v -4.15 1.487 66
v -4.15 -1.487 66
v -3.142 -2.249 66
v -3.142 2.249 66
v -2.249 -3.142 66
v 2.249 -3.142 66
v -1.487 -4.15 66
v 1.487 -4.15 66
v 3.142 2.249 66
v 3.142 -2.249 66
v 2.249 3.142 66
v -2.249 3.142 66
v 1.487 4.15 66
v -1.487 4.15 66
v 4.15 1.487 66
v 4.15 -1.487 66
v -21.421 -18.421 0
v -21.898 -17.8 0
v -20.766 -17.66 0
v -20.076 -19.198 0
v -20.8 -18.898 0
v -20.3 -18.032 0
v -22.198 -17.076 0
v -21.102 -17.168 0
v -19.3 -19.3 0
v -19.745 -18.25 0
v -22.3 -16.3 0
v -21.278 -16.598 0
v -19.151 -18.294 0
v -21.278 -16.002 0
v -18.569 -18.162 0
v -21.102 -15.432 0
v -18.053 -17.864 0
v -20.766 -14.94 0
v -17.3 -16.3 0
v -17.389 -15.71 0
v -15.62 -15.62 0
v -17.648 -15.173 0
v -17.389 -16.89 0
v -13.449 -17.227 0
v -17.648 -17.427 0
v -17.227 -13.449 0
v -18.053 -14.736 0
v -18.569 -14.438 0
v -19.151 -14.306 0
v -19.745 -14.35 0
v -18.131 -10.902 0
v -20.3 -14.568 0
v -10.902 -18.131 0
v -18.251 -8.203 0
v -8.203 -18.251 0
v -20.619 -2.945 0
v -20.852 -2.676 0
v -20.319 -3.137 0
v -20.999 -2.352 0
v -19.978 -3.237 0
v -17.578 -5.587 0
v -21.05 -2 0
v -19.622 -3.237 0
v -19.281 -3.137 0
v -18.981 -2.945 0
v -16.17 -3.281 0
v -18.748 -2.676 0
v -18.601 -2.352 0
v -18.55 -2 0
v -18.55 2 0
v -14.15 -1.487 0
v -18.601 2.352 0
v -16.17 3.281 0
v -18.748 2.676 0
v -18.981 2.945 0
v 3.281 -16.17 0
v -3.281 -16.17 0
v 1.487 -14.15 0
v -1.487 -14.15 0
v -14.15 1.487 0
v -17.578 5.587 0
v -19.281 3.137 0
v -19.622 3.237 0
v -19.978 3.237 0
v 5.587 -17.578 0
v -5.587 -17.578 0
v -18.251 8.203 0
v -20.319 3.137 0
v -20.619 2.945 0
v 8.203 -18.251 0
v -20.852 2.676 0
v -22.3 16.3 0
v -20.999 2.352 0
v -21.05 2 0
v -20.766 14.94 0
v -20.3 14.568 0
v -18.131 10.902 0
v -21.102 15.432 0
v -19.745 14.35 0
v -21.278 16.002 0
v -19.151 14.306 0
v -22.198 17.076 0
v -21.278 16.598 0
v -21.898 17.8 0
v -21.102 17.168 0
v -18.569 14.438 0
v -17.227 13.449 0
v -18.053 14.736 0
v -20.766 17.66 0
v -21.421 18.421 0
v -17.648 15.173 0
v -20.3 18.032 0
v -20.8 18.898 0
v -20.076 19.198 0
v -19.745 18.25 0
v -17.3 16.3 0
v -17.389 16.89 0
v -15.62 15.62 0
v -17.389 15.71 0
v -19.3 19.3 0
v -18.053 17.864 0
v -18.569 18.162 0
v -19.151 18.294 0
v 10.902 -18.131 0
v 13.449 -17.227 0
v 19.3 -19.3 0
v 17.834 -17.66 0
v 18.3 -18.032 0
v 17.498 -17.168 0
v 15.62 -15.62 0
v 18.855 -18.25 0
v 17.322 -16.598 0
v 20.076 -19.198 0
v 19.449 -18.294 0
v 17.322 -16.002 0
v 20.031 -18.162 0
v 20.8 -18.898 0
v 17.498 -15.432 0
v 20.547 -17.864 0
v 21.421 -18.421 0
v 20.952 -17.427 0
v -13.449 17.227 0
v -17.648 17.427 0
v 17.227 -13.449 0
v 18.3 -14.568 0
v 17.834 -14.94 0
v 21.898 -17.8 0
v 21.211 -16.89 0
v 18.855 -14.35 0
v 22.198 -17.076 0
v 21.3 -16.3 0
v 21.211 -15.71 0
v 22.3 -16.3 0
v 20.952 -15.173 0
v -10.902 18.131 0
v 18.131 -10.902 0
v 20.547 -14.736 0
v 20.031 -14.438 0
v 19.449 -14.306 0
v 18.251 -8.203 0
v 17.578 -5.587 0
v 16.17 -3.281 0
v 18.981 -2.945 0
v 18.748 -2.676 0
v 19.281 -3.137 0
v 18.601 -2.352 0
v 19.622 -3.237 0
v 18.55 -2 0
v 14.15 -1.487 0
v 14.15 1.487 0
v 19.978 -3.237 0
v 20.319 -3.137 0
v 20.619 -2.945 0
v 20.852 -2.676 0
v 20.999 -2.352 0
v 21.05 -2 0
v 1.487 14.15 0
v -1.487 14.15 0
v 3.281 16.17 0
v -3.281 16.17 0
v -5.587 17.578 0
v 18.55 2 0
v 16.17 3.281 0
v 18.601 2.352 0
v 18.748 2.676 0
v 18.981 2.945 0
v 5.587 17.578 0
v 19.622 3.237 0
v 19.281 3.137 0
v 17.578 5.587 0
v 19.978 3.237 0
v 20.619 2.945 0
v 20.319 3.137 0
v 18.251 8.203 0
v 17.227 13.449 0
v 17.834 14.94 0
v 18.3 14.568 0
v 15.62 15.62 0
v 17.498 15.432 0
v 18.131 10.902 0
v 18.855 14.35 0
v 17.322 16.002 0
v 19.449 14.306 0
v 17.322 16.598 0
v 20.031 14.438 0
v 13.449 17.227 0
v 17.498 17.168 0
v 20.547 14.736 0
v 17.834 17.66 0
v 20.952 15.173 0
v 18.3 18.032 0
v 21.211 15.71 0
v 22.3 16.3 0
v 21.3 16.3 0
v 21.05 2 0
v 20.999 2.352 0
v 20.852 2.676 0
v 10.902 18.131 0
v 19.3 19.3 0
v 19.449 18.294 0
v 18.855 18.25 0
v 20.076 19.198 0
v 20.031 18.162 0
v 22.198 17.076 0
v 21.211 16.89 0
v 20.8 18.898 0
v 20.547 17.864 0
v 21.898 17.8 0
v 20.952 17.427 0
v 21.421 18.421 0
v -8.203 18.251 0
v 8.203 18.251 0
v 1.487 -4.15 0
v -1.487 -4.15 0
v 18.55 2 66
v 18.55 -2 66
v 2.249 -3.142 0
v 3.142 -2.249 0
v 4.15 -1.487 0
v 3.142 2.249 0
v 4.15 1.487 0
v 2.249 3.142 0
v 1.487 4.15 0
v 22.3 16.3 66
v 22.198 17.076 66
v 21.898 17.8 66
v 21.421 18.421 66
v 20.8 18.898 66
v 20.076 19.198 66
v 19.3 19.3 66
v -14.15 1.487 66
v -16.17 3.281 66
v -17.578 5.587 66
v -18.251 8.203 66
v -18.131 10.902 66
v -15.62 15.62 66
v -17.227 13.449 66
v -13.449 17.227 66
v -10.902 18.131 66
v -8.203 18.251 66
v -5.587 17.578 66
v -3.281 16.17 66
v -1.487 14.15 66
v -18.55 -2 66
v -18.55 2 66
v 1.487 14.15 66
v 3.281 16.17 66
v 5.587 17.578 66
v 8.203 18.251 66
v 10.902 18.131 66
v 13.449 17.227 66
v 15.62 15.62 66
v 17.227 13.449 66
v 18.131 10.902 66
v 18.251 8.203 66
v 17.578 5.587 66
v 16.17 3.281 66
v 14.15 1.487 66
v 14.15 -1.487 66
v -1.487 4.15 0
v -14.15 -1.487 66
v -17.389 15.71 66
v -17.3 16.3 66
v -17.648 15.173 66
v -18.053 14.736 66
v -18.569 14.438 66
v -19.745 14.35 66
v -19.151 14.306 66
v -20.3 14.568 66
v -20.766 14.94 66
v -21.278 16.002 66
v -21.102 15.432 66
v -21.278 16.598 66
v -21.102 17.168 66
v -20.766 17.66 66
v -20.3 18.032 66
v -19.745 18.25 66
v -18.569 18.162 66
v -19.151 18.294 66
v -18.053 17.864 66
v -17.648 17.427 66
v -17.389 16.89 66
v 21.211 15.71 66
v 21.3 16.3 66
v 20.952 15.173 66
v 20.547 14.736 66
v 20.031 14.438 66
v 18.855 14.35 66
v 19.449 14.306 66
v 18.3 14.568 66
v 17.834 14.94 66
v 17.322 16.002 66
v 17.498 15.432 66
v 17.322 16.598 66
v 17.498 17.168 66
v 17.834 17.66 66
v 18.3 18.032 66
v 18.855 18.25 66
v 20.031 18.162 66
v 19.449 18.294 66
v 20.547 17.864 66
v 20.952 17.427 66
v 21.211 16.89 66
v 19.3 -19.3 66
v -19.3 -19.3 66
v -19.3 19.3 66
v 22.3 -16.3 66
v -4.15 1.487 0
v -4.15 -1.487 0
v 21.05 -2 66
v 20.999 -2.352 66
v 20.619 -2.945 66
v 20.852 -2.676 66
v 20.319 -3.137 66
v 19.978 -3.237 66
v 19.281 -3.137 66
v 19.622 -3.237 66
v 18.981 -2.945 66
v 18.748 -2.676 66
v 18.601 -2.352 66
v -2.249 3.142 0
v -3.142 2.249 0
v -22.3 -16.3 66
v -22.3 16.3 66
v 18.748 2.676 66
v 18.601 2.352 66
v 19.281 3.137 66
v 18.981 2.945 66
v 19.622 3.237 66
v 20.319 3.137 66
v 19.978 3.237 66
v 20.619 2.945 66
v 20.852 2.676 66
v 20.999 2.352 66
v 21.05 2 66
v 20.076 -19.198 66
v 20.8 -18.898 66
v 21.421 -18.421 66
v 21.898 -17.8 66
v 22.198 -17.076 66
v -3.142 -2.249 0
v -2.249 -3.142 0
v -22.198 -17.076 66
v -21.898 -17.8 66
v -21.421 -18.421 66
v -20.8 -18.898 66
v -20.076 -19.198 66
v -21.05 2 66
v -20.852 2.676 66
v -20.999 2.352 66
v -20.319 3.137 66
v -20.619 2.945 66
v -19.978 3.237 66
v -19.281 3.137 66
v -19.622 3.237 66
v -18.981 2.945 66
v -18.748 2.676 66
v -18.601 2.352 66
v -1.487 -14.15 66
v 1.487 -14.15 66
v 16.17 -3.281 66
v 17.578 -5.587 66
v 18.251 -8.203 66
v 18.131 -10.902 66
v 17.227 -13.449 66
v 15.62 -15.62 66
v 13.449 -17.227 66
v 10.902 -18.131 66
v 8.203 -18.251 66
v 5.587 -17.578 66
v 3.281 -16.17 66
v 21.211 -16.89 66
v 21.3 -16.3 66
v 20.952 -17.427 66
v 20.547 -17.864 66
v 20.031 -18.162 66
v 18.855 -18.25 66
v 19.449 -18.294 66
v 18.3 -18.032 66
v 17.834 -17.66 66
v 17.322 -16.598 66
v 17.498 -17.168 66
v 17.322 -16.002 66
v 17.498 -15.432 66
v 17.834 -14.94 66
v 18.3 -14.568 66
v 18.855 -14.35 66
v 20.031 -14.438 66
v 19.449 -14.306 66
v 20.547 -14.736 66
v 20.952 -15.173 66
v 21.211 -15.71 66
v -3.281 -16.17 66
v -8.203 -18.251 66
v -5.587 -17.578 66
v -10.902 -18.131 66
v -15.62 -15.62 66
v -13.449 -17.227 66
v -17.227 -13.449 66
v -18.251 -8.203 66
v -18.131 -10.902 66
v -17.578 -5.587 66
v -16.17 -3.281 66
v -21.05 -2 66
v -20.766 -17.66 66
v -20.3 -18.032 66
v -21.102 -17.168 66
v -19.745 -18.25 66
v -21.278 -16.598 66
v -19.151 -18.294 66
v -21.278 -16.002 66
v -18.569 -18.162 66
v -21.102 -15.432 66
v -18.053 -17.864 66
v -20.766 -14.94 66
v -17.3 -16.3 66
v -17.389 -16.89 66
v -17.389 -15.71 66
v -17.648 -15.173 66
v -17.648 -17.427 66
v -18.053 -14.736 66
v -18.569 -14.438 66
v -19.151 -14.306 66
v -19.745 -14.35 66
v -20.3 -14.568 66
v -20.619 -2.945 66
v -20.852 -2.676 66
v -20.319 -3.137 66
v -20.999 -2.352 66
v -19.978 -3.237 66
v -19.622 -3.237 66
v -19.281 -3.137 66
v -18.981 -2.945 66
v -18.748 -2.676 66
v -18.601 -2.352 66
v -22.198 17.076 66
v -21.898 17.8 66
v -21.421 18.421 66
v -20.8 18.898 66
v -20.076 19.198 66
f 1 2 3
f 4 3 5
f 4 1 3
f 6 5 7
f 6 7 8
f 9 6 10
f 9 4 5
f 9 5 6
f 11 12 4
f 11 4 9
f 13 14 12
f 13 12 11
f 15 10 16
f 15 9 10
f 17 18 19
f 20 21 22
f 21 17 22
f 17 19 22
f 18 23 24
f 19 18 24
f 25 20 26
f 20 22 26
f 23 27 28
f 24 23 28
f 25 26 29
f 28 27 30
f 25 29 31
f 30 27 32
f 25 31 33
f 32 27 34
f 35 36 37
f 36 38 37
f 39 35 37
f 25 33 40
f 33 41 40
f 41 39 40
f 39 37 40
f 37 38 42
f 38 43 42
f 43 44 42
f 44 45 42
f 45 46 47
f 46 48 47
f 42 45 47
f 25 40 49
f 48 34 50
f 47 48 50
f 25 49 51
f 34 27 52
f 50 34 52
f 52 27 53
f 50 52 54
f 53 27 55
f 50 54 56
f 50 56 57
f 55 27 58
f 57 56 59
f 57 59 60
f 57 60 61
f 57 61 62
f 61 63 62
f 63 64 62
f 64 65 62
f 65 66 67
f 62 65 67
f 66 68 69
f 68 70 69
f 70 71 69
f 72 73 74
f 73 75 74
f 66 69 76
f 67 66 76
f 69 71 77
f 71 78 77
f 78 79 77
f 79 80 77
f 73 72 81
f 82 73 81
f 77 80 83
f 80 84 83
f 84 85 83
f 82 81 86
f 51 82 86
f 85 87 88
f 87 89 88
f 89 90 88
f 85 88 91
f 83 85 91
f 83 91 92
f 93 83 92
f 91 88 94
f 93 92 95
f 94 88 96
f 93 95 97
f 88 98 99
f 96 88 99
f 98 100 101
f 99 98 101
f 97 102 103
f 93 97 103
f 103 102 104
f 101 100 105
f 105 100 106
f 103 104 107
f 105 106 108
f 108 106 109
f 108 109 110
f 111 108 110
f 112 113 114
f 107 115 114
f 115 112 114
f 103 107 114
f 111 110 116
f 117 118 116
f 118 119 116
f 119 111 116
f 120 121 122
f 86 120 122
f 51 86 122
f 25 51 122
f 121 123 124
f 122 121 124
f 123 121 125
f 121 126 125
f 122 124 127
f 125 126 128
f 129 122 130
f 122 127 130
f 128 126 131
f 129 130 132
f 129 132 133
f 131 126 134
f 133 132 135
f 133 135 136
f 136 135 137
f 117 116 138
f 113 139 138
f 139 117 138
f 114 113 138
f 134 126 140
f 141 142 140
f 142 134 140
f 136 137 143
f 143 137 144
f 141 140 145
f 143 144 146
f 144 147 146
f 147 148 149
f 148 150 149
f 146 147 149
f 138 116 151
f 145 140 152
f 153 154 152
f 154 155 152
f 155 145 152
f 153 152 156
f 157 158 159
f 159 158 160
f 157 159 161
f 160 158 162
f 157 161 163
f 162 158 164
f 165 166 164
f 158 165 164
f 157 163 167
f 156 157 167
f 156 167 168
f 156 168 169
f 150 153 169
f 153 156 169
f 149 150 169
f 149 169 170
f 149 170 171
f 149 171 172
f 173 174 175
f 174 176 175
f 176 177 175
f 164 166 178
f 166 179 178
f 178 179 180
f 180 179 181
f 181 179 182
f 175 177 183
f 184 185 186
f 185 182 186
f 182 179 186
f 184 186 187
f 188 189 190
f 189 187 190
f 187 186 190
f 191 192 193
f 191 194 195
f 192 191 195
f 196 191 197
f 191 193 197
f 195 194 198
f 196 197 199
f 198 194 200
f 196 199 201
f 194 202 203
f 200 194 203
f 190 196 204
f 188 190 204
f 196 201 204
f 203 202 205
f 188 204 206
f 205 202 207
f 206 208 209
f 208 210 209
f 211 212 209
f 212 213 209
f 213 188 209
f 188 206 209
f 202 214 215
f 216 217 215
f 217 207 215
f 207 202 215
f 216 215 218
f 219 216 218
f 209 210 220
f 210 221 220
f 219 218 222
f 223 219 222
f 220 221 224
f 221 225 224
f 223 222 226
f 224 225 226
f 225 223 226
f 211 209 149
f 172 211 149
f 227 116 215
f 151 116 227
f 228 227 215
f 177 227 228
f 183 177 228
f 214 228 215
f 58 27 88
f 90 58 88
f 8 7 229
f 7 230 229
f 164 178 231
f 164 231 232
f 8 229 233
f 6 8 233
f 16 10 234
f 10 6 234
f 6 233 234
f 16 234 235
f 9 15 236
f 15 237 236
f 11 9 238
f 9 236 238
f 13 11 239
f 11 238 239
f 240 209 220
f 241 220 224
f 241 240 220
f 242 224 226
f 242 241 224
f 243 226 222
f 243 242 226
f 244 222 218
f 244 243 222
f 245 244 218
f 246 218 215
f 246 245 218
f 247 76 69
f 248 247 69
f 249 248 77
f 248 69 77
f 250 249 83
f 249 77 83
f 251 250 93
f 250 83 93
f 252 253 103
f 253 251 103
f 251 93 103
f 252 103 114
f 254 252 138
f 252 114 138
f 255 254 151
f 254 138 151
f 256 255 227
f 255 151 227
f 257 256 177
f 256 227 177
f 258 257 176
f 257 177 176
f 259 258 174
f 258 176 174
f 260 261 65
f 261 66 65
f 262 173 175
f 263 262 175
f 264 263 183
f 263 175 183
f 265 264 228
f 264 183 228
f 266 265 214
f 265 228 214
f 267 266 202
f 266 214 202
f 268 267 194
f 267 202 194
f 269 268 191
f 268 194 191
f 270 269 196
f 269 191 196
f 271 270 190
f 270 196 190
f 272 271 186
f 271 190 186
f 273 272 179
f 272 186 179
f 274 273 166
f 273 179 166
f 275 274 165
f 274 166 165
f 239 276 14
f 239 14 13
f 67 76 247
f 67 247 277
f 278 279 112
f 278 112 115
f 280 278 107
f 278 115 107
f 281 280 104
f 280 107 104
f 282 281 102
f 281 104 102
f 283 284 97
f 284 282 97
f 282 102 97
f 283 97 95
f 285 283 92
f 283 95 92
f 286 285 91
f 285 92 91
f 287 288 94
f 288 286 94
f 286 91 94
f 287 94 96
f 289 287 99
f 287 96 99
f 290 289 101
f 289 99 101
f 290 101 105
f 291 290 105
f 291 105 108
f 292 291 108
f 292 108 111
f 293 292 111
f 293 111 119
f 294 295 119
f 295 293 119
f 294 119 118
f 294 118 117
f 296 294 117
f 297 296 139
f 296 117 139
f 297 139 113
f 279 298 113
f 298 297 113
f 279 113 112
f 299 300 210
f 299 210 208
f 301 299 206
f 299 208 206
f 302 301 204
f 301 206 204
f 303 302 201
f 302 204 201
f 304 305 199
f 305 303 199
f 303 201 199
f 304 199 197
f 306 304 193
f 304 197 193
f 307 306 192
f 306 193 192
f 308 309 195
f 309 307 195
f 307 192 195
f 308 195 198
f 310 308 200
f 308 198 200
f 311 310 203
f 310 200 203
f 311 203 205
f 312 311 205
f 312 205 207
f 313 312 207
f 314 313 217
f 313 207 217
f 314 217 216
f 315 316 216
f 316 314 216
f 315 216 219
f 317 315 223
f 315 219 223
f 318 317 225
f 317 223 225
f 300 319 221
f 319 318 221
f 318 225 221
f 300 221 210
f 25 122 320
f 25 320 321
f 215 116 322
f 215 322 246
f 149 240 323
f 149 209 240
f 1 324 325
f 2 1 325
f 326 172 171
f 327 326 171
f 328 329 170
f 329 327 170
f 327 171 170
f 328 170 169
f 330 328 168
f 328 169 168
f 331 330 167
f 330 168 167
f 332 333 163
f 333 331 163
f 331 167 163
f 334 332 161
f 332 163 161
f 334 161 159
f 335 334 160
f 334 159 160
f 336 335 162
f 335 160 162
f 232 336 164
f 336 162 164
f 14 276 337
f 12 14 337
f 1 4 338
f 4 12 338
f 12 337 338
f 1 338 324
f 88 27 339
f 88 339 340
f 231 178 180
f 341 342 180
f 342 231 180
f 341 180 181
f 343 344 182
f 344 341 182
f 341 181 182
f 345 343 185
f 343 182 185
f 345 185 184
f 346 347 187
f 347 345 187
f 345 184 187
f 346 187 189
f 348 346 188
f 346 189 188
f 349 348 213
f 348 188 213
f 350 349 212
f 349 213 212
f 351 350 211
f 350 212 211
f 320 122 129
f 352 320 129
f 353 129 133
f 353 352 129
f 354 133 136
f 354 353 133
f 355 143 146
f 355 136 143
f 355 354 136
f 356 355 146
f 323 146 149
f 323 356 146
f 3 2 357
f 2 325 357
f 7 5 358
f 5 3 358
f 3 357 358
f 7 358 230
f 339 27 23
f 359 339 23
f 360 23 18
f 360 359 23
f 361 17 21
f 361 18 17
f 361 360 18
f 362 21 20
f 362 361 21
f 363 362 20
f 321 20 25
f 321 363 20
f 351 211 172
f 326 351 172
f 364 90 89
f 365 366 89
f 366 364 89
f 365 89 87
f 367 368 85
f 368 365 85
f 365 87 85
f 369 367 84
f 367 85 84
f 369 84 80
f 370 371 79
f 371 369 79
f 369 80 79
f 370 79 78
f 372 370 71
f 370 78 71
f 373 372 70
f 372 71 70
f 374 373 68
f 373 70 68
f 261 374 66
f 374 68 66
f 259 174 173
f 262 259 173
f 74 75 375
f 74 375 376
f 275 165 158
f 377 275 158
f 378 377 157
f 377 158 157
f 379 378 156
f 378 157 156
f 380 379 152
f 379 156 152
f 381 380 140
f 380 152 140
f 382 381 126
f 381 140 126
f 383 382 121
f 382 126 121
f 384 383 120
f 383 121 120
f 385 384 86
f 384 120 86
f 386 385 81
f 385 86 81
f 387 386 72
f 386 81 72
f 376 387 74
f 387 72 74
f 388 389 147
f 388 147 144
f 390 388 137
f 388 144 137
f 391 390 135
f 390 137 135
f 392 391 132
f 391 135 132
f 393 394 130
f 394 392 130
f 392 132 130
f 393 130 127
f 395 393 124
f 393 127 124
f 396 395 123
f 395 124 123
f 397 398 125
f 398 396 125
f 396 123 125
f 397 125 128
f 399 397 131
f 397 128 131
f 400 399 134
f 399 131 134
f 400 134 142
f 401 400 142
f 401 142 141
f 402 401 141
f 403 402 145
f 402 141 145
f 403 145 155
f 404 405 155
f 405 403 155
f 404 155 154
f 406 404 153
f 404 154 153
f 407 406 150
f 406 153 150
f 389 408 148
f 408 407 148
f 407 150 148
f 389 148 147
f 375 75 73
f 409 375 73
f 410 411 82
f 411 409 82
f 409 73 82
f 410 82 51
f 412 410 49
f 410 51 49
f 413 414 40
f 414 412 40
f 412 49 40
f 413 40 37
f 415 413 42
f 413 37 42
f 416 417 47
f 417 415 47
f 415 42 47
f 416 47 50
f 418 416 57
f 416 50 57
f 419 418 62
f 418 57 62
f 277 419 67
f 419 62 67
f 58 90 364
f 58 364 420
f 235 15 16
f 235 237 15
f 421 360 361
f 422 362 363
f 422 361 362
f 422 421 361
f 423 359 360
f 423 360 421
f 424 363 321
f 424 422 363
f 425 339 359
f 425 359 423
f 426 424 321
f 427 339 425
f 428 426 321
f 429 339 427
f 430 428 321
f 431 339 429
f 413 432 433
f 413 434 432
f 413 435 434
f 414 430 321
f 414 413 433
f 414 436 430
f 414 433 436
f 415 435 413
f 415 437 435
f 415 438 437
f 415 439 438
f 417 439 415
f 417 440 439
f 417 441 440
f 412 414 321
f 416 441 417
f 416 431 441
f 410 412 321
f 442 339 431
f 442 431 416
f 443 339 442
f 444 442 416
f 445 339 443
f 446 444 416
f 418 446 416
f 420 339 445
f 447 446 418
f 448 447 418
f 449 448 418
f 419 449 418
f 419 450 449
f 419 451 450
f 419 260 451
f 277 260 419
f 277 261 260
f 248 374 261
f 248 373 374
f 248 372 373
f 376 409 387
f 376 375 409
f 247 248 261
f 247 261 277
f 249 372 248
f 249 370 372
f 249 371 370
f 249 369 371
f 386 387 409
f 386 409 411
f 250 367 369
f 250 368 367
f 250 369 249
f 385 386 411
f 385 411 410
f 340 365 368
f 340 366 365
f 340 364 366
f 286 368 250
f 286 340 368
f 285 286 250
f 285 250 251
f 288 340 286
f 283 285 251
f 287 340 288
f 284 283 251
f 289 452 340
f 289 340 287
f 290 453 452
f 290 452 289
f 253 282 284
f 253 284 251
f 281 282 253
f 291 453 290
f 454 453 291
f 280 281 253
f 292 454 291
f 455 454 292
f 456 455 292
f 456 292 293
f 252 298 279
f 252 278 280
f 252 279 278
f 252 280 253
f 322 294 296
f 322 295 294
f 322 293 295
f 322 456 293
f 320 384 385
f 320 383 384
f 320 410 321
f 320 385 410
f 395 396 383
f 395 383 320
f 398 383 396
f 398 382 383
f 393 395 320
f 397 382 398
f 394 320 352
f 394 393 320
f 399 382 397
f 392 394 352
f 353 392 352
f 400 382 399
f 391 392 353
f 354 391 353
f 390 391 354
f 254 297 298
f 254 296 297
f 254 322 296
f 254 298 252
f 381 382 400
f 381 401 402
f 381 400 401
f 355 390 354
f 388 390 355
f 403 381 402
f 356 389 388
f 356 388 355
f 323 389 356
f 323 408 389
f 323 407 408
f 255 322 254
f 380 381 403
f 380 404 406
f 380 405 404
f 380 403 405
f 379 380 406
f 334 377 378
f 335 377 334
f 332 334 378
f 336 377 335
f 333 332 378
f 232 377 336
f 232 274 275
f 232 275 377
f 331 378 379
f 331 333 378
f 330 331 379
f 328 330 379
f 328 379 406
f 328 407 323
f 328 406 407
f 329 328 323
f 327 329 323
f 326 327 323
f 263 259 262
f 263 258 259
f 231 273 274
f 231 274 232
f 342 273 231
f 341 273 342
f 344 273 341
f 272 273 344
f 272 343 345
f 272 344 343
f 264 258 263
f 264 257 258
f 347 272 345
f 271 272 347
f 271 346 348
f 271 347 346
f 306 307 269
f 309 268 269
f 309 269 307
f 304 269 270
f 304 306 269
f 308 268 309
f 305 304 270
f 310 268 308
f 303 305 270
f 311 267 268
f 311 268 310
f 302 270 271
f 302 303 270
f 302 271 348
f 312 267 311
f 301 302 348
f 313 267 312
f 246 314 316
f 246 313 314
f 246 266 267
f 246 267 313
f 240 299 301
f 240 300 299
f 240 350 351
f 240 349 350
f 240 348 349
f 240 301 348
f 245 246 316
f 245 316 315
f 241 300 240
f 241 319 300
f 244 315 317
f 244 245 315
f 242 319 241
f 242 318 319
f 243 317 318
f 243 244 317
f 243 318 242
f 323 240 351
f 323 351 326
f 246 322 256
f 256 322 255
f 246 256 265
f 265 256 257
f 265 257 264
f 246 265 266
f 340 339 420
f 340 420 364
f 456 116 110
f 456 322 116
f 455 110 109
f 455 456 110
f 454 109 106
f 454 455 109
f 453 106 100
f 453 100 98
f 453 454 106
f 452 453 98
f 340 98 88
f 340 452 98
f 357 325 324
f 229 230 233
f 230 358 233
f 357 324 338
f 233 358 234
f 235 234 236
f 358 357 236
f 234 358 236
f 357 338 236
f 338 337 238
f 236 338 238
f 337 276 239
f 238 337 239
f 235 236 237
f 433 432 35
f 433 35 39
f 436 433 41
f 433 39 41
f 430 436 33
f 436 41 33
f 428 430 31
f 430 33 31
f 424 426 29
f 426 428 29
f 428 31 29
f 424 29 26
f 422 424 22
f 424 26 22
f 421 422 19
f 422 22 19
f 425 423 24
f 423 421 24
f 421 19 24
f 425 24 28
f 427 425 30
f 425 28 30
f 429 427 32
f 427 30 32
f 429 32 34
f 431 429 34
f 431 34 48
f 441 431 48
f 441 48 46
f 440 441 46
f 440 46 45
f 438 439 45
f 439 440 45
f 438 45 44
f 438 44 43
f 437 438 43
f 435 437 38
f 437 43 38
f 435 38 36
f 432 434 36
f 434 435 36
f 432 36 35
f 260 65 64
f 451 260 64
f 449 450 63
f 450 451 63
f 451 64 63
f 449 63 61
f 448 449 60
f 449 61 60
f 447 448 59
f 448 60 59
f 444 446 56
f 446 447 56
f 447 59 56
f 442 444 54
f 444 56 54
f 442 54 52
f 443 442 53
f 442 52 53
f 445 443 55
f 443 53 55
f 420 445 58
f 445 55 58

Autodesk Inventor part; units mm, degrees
ref_plane "YZ Plane" through (0, 0, 0) normal (1, 0, 0) x (0, 1, 0)
ref_plane "XZ Plane" through (0, 0, 0) normal (0, 1, 0) x (-1, 0, 0)
ref_plane "XY Plane" through (0, 0, 0) normal (0, 0, 1) x (1, 0, 0)
sketch "Эскиз1" plane through (0, 0, 0) normal (0, 0, 1) x (1, 0, 0)
  circle A0 centre (-9.15, 9.15) radius 9.15
  line L0 (0, 0) -> (-9.15, 0) construction
  line L1 (-9.15, 0) -> (-9.15, 9.15) construction
  line L2 (-9.15, 9.15) -> (0, 9.15) construction
  line L3 (0, 9.15) -> (0, 0) construction
  circle A1 centre (9.15, 9.15) radius 9.15
  circle A2 centre (-9.15, -9.15) radius 9.15
  circle A3 centre (9.15, -9.15) radius 9.15
  line L4 (0, 9.15) -> (-1.4869, 9.15) construction
  line L5 (-1.4869, 9.15) -> (-1.4869, 4.15) construction
  line L6 (-1.4869, 4.15) -> (0, 4.15) construction
  line L7 (0, 4.15) -> (0, 9.15) construction
  line L8 (-1.4869, 4.15) -> (1.4869, 4.15)
  line L9 (-1.4869, -4.15) -> (1.4869, -4.15)
  line L10 (-9.15, 0) -> (-4.15, 0) construction
  line L11 (-4.15, 0) -> (-4.15, 1.4869) construction
  line L12 (-4.15, 1.4869) -> (-9.15, 1.4869) construction
  line L13 (-9.15, 1.4869) -> (-9.15, 0) construction
  line L14 (-4.15, 1.4869) -> (-4.15, -1.4869)
  line L15 (4.15, 1.4869) -> (4.15, -1.4869)
  line L16 (-9.15, 9.15) -> (-22.3, 9.15) construction
  line L17 (-22.3, 9.15) -> (-22.3, 19.3) construction
  line L18 (-22.3, 19.3) -> (-9.15, 19.3) construction
  line L19 (-9.15, 19.3) -> (-9.15, 9.15) construction
  line L20 (-22.3, 19.3) -> (22.3, 19.3)
  line L21 (22.3, 19.3) -> (22.3, -19.3)
  line L22 (22.3, -19.3) -> (-22.3, -19.3)
  line L23 (-22.3, -19.3) -> (-22.3, 19.3)
  line L24 (-14.15, 1.4869) -> (-14.15, -1.4869)
  line L25 (-1.4869, 14.15) -> (1.4869, 14.15)
  line L26 (-1.4869, -14.15) -> (1.4869, -14.15)
  line L27 (14.15, 1.4869) -> (14.15, -1.4869)
  line L28 (-22.3, 19.3) -> (-19.3, 19.3) construction
  line L29 (-19.3, 19.3) -> (-19.3, 16.3) construction
  line L30 (-19.3, 16.3) -> (-22.3, 16.3) construction
  line L31 (-22.3, 16.3) -> (-22.3, 19.3) construction
  circle A4 centre (-19.3, 16.3) radius 2
  circle A5 centre (19.3, 16.3) radius 2
  circle A6 centre (-19.3, -16.3) radius 2
  circle A7 centre (19.3, -16.3) radius 2
  line L32 (-22.3, 0) -> (-19.8, 0) construction
  line L33 (-19.8, 0) -> (-19.8, 2) construction
  circle A8 centre (-19.8, 2) radius 1.25
  circle A9 centre (-19.8, -2) radius 1.25
  circle A10 centre (19.8, 2) radius 1.25
  circle A11 centre (19.8, -2) radius 1.25
  line L34 (-9.15, -9.15) -> (-22.3, -9.15) construction
  line L35 (-19.8, 2) -> (-21.05, 2) construction
  line L36 (-19.8, -2) -> (-21.05, -2) construction
  line L37 (-21.05, 2) -> (-21.05, -2)
  line L38 (-18.55, 2) -> (-18.55, -2)
  line L39 (21.05, 2) -> (21.05, -2)
  line L40 (18.55, 2) -> (18.55, -2)
  dimension "d22" = 2.5
  dimension "d0" = 18.3
  dimension "d1" = 9.15
  dimension "d2" = 9.15
  dimension "d3" = 5
  dimension "d4" = 5
  dimension "d5" = 13.15
  dimension "d6" = 10.15
  dimension "d7" = 44.6
  dimension "d8" = 38.6
  dimension "d17" = 3
  dimension "d18" = 3
  dimension "d19" = 4
  dimension "d20" = 2.5
  dimension "d21" = 2
extrude "Выдавливание1" add sketch "Эскиз1" along normal blind 66 contours L8 A1 L15 A3 L9 A2 L14 A0 | L20 L21 L22 L23
fillet "Сопряжение1" radius 3 4 edges at (22.3, 19.3, 33) (22.3, -19.3, 33) (-22.3, 19.3, 33) (-22.3, -19.3, 33)
properties part number "akkum"
